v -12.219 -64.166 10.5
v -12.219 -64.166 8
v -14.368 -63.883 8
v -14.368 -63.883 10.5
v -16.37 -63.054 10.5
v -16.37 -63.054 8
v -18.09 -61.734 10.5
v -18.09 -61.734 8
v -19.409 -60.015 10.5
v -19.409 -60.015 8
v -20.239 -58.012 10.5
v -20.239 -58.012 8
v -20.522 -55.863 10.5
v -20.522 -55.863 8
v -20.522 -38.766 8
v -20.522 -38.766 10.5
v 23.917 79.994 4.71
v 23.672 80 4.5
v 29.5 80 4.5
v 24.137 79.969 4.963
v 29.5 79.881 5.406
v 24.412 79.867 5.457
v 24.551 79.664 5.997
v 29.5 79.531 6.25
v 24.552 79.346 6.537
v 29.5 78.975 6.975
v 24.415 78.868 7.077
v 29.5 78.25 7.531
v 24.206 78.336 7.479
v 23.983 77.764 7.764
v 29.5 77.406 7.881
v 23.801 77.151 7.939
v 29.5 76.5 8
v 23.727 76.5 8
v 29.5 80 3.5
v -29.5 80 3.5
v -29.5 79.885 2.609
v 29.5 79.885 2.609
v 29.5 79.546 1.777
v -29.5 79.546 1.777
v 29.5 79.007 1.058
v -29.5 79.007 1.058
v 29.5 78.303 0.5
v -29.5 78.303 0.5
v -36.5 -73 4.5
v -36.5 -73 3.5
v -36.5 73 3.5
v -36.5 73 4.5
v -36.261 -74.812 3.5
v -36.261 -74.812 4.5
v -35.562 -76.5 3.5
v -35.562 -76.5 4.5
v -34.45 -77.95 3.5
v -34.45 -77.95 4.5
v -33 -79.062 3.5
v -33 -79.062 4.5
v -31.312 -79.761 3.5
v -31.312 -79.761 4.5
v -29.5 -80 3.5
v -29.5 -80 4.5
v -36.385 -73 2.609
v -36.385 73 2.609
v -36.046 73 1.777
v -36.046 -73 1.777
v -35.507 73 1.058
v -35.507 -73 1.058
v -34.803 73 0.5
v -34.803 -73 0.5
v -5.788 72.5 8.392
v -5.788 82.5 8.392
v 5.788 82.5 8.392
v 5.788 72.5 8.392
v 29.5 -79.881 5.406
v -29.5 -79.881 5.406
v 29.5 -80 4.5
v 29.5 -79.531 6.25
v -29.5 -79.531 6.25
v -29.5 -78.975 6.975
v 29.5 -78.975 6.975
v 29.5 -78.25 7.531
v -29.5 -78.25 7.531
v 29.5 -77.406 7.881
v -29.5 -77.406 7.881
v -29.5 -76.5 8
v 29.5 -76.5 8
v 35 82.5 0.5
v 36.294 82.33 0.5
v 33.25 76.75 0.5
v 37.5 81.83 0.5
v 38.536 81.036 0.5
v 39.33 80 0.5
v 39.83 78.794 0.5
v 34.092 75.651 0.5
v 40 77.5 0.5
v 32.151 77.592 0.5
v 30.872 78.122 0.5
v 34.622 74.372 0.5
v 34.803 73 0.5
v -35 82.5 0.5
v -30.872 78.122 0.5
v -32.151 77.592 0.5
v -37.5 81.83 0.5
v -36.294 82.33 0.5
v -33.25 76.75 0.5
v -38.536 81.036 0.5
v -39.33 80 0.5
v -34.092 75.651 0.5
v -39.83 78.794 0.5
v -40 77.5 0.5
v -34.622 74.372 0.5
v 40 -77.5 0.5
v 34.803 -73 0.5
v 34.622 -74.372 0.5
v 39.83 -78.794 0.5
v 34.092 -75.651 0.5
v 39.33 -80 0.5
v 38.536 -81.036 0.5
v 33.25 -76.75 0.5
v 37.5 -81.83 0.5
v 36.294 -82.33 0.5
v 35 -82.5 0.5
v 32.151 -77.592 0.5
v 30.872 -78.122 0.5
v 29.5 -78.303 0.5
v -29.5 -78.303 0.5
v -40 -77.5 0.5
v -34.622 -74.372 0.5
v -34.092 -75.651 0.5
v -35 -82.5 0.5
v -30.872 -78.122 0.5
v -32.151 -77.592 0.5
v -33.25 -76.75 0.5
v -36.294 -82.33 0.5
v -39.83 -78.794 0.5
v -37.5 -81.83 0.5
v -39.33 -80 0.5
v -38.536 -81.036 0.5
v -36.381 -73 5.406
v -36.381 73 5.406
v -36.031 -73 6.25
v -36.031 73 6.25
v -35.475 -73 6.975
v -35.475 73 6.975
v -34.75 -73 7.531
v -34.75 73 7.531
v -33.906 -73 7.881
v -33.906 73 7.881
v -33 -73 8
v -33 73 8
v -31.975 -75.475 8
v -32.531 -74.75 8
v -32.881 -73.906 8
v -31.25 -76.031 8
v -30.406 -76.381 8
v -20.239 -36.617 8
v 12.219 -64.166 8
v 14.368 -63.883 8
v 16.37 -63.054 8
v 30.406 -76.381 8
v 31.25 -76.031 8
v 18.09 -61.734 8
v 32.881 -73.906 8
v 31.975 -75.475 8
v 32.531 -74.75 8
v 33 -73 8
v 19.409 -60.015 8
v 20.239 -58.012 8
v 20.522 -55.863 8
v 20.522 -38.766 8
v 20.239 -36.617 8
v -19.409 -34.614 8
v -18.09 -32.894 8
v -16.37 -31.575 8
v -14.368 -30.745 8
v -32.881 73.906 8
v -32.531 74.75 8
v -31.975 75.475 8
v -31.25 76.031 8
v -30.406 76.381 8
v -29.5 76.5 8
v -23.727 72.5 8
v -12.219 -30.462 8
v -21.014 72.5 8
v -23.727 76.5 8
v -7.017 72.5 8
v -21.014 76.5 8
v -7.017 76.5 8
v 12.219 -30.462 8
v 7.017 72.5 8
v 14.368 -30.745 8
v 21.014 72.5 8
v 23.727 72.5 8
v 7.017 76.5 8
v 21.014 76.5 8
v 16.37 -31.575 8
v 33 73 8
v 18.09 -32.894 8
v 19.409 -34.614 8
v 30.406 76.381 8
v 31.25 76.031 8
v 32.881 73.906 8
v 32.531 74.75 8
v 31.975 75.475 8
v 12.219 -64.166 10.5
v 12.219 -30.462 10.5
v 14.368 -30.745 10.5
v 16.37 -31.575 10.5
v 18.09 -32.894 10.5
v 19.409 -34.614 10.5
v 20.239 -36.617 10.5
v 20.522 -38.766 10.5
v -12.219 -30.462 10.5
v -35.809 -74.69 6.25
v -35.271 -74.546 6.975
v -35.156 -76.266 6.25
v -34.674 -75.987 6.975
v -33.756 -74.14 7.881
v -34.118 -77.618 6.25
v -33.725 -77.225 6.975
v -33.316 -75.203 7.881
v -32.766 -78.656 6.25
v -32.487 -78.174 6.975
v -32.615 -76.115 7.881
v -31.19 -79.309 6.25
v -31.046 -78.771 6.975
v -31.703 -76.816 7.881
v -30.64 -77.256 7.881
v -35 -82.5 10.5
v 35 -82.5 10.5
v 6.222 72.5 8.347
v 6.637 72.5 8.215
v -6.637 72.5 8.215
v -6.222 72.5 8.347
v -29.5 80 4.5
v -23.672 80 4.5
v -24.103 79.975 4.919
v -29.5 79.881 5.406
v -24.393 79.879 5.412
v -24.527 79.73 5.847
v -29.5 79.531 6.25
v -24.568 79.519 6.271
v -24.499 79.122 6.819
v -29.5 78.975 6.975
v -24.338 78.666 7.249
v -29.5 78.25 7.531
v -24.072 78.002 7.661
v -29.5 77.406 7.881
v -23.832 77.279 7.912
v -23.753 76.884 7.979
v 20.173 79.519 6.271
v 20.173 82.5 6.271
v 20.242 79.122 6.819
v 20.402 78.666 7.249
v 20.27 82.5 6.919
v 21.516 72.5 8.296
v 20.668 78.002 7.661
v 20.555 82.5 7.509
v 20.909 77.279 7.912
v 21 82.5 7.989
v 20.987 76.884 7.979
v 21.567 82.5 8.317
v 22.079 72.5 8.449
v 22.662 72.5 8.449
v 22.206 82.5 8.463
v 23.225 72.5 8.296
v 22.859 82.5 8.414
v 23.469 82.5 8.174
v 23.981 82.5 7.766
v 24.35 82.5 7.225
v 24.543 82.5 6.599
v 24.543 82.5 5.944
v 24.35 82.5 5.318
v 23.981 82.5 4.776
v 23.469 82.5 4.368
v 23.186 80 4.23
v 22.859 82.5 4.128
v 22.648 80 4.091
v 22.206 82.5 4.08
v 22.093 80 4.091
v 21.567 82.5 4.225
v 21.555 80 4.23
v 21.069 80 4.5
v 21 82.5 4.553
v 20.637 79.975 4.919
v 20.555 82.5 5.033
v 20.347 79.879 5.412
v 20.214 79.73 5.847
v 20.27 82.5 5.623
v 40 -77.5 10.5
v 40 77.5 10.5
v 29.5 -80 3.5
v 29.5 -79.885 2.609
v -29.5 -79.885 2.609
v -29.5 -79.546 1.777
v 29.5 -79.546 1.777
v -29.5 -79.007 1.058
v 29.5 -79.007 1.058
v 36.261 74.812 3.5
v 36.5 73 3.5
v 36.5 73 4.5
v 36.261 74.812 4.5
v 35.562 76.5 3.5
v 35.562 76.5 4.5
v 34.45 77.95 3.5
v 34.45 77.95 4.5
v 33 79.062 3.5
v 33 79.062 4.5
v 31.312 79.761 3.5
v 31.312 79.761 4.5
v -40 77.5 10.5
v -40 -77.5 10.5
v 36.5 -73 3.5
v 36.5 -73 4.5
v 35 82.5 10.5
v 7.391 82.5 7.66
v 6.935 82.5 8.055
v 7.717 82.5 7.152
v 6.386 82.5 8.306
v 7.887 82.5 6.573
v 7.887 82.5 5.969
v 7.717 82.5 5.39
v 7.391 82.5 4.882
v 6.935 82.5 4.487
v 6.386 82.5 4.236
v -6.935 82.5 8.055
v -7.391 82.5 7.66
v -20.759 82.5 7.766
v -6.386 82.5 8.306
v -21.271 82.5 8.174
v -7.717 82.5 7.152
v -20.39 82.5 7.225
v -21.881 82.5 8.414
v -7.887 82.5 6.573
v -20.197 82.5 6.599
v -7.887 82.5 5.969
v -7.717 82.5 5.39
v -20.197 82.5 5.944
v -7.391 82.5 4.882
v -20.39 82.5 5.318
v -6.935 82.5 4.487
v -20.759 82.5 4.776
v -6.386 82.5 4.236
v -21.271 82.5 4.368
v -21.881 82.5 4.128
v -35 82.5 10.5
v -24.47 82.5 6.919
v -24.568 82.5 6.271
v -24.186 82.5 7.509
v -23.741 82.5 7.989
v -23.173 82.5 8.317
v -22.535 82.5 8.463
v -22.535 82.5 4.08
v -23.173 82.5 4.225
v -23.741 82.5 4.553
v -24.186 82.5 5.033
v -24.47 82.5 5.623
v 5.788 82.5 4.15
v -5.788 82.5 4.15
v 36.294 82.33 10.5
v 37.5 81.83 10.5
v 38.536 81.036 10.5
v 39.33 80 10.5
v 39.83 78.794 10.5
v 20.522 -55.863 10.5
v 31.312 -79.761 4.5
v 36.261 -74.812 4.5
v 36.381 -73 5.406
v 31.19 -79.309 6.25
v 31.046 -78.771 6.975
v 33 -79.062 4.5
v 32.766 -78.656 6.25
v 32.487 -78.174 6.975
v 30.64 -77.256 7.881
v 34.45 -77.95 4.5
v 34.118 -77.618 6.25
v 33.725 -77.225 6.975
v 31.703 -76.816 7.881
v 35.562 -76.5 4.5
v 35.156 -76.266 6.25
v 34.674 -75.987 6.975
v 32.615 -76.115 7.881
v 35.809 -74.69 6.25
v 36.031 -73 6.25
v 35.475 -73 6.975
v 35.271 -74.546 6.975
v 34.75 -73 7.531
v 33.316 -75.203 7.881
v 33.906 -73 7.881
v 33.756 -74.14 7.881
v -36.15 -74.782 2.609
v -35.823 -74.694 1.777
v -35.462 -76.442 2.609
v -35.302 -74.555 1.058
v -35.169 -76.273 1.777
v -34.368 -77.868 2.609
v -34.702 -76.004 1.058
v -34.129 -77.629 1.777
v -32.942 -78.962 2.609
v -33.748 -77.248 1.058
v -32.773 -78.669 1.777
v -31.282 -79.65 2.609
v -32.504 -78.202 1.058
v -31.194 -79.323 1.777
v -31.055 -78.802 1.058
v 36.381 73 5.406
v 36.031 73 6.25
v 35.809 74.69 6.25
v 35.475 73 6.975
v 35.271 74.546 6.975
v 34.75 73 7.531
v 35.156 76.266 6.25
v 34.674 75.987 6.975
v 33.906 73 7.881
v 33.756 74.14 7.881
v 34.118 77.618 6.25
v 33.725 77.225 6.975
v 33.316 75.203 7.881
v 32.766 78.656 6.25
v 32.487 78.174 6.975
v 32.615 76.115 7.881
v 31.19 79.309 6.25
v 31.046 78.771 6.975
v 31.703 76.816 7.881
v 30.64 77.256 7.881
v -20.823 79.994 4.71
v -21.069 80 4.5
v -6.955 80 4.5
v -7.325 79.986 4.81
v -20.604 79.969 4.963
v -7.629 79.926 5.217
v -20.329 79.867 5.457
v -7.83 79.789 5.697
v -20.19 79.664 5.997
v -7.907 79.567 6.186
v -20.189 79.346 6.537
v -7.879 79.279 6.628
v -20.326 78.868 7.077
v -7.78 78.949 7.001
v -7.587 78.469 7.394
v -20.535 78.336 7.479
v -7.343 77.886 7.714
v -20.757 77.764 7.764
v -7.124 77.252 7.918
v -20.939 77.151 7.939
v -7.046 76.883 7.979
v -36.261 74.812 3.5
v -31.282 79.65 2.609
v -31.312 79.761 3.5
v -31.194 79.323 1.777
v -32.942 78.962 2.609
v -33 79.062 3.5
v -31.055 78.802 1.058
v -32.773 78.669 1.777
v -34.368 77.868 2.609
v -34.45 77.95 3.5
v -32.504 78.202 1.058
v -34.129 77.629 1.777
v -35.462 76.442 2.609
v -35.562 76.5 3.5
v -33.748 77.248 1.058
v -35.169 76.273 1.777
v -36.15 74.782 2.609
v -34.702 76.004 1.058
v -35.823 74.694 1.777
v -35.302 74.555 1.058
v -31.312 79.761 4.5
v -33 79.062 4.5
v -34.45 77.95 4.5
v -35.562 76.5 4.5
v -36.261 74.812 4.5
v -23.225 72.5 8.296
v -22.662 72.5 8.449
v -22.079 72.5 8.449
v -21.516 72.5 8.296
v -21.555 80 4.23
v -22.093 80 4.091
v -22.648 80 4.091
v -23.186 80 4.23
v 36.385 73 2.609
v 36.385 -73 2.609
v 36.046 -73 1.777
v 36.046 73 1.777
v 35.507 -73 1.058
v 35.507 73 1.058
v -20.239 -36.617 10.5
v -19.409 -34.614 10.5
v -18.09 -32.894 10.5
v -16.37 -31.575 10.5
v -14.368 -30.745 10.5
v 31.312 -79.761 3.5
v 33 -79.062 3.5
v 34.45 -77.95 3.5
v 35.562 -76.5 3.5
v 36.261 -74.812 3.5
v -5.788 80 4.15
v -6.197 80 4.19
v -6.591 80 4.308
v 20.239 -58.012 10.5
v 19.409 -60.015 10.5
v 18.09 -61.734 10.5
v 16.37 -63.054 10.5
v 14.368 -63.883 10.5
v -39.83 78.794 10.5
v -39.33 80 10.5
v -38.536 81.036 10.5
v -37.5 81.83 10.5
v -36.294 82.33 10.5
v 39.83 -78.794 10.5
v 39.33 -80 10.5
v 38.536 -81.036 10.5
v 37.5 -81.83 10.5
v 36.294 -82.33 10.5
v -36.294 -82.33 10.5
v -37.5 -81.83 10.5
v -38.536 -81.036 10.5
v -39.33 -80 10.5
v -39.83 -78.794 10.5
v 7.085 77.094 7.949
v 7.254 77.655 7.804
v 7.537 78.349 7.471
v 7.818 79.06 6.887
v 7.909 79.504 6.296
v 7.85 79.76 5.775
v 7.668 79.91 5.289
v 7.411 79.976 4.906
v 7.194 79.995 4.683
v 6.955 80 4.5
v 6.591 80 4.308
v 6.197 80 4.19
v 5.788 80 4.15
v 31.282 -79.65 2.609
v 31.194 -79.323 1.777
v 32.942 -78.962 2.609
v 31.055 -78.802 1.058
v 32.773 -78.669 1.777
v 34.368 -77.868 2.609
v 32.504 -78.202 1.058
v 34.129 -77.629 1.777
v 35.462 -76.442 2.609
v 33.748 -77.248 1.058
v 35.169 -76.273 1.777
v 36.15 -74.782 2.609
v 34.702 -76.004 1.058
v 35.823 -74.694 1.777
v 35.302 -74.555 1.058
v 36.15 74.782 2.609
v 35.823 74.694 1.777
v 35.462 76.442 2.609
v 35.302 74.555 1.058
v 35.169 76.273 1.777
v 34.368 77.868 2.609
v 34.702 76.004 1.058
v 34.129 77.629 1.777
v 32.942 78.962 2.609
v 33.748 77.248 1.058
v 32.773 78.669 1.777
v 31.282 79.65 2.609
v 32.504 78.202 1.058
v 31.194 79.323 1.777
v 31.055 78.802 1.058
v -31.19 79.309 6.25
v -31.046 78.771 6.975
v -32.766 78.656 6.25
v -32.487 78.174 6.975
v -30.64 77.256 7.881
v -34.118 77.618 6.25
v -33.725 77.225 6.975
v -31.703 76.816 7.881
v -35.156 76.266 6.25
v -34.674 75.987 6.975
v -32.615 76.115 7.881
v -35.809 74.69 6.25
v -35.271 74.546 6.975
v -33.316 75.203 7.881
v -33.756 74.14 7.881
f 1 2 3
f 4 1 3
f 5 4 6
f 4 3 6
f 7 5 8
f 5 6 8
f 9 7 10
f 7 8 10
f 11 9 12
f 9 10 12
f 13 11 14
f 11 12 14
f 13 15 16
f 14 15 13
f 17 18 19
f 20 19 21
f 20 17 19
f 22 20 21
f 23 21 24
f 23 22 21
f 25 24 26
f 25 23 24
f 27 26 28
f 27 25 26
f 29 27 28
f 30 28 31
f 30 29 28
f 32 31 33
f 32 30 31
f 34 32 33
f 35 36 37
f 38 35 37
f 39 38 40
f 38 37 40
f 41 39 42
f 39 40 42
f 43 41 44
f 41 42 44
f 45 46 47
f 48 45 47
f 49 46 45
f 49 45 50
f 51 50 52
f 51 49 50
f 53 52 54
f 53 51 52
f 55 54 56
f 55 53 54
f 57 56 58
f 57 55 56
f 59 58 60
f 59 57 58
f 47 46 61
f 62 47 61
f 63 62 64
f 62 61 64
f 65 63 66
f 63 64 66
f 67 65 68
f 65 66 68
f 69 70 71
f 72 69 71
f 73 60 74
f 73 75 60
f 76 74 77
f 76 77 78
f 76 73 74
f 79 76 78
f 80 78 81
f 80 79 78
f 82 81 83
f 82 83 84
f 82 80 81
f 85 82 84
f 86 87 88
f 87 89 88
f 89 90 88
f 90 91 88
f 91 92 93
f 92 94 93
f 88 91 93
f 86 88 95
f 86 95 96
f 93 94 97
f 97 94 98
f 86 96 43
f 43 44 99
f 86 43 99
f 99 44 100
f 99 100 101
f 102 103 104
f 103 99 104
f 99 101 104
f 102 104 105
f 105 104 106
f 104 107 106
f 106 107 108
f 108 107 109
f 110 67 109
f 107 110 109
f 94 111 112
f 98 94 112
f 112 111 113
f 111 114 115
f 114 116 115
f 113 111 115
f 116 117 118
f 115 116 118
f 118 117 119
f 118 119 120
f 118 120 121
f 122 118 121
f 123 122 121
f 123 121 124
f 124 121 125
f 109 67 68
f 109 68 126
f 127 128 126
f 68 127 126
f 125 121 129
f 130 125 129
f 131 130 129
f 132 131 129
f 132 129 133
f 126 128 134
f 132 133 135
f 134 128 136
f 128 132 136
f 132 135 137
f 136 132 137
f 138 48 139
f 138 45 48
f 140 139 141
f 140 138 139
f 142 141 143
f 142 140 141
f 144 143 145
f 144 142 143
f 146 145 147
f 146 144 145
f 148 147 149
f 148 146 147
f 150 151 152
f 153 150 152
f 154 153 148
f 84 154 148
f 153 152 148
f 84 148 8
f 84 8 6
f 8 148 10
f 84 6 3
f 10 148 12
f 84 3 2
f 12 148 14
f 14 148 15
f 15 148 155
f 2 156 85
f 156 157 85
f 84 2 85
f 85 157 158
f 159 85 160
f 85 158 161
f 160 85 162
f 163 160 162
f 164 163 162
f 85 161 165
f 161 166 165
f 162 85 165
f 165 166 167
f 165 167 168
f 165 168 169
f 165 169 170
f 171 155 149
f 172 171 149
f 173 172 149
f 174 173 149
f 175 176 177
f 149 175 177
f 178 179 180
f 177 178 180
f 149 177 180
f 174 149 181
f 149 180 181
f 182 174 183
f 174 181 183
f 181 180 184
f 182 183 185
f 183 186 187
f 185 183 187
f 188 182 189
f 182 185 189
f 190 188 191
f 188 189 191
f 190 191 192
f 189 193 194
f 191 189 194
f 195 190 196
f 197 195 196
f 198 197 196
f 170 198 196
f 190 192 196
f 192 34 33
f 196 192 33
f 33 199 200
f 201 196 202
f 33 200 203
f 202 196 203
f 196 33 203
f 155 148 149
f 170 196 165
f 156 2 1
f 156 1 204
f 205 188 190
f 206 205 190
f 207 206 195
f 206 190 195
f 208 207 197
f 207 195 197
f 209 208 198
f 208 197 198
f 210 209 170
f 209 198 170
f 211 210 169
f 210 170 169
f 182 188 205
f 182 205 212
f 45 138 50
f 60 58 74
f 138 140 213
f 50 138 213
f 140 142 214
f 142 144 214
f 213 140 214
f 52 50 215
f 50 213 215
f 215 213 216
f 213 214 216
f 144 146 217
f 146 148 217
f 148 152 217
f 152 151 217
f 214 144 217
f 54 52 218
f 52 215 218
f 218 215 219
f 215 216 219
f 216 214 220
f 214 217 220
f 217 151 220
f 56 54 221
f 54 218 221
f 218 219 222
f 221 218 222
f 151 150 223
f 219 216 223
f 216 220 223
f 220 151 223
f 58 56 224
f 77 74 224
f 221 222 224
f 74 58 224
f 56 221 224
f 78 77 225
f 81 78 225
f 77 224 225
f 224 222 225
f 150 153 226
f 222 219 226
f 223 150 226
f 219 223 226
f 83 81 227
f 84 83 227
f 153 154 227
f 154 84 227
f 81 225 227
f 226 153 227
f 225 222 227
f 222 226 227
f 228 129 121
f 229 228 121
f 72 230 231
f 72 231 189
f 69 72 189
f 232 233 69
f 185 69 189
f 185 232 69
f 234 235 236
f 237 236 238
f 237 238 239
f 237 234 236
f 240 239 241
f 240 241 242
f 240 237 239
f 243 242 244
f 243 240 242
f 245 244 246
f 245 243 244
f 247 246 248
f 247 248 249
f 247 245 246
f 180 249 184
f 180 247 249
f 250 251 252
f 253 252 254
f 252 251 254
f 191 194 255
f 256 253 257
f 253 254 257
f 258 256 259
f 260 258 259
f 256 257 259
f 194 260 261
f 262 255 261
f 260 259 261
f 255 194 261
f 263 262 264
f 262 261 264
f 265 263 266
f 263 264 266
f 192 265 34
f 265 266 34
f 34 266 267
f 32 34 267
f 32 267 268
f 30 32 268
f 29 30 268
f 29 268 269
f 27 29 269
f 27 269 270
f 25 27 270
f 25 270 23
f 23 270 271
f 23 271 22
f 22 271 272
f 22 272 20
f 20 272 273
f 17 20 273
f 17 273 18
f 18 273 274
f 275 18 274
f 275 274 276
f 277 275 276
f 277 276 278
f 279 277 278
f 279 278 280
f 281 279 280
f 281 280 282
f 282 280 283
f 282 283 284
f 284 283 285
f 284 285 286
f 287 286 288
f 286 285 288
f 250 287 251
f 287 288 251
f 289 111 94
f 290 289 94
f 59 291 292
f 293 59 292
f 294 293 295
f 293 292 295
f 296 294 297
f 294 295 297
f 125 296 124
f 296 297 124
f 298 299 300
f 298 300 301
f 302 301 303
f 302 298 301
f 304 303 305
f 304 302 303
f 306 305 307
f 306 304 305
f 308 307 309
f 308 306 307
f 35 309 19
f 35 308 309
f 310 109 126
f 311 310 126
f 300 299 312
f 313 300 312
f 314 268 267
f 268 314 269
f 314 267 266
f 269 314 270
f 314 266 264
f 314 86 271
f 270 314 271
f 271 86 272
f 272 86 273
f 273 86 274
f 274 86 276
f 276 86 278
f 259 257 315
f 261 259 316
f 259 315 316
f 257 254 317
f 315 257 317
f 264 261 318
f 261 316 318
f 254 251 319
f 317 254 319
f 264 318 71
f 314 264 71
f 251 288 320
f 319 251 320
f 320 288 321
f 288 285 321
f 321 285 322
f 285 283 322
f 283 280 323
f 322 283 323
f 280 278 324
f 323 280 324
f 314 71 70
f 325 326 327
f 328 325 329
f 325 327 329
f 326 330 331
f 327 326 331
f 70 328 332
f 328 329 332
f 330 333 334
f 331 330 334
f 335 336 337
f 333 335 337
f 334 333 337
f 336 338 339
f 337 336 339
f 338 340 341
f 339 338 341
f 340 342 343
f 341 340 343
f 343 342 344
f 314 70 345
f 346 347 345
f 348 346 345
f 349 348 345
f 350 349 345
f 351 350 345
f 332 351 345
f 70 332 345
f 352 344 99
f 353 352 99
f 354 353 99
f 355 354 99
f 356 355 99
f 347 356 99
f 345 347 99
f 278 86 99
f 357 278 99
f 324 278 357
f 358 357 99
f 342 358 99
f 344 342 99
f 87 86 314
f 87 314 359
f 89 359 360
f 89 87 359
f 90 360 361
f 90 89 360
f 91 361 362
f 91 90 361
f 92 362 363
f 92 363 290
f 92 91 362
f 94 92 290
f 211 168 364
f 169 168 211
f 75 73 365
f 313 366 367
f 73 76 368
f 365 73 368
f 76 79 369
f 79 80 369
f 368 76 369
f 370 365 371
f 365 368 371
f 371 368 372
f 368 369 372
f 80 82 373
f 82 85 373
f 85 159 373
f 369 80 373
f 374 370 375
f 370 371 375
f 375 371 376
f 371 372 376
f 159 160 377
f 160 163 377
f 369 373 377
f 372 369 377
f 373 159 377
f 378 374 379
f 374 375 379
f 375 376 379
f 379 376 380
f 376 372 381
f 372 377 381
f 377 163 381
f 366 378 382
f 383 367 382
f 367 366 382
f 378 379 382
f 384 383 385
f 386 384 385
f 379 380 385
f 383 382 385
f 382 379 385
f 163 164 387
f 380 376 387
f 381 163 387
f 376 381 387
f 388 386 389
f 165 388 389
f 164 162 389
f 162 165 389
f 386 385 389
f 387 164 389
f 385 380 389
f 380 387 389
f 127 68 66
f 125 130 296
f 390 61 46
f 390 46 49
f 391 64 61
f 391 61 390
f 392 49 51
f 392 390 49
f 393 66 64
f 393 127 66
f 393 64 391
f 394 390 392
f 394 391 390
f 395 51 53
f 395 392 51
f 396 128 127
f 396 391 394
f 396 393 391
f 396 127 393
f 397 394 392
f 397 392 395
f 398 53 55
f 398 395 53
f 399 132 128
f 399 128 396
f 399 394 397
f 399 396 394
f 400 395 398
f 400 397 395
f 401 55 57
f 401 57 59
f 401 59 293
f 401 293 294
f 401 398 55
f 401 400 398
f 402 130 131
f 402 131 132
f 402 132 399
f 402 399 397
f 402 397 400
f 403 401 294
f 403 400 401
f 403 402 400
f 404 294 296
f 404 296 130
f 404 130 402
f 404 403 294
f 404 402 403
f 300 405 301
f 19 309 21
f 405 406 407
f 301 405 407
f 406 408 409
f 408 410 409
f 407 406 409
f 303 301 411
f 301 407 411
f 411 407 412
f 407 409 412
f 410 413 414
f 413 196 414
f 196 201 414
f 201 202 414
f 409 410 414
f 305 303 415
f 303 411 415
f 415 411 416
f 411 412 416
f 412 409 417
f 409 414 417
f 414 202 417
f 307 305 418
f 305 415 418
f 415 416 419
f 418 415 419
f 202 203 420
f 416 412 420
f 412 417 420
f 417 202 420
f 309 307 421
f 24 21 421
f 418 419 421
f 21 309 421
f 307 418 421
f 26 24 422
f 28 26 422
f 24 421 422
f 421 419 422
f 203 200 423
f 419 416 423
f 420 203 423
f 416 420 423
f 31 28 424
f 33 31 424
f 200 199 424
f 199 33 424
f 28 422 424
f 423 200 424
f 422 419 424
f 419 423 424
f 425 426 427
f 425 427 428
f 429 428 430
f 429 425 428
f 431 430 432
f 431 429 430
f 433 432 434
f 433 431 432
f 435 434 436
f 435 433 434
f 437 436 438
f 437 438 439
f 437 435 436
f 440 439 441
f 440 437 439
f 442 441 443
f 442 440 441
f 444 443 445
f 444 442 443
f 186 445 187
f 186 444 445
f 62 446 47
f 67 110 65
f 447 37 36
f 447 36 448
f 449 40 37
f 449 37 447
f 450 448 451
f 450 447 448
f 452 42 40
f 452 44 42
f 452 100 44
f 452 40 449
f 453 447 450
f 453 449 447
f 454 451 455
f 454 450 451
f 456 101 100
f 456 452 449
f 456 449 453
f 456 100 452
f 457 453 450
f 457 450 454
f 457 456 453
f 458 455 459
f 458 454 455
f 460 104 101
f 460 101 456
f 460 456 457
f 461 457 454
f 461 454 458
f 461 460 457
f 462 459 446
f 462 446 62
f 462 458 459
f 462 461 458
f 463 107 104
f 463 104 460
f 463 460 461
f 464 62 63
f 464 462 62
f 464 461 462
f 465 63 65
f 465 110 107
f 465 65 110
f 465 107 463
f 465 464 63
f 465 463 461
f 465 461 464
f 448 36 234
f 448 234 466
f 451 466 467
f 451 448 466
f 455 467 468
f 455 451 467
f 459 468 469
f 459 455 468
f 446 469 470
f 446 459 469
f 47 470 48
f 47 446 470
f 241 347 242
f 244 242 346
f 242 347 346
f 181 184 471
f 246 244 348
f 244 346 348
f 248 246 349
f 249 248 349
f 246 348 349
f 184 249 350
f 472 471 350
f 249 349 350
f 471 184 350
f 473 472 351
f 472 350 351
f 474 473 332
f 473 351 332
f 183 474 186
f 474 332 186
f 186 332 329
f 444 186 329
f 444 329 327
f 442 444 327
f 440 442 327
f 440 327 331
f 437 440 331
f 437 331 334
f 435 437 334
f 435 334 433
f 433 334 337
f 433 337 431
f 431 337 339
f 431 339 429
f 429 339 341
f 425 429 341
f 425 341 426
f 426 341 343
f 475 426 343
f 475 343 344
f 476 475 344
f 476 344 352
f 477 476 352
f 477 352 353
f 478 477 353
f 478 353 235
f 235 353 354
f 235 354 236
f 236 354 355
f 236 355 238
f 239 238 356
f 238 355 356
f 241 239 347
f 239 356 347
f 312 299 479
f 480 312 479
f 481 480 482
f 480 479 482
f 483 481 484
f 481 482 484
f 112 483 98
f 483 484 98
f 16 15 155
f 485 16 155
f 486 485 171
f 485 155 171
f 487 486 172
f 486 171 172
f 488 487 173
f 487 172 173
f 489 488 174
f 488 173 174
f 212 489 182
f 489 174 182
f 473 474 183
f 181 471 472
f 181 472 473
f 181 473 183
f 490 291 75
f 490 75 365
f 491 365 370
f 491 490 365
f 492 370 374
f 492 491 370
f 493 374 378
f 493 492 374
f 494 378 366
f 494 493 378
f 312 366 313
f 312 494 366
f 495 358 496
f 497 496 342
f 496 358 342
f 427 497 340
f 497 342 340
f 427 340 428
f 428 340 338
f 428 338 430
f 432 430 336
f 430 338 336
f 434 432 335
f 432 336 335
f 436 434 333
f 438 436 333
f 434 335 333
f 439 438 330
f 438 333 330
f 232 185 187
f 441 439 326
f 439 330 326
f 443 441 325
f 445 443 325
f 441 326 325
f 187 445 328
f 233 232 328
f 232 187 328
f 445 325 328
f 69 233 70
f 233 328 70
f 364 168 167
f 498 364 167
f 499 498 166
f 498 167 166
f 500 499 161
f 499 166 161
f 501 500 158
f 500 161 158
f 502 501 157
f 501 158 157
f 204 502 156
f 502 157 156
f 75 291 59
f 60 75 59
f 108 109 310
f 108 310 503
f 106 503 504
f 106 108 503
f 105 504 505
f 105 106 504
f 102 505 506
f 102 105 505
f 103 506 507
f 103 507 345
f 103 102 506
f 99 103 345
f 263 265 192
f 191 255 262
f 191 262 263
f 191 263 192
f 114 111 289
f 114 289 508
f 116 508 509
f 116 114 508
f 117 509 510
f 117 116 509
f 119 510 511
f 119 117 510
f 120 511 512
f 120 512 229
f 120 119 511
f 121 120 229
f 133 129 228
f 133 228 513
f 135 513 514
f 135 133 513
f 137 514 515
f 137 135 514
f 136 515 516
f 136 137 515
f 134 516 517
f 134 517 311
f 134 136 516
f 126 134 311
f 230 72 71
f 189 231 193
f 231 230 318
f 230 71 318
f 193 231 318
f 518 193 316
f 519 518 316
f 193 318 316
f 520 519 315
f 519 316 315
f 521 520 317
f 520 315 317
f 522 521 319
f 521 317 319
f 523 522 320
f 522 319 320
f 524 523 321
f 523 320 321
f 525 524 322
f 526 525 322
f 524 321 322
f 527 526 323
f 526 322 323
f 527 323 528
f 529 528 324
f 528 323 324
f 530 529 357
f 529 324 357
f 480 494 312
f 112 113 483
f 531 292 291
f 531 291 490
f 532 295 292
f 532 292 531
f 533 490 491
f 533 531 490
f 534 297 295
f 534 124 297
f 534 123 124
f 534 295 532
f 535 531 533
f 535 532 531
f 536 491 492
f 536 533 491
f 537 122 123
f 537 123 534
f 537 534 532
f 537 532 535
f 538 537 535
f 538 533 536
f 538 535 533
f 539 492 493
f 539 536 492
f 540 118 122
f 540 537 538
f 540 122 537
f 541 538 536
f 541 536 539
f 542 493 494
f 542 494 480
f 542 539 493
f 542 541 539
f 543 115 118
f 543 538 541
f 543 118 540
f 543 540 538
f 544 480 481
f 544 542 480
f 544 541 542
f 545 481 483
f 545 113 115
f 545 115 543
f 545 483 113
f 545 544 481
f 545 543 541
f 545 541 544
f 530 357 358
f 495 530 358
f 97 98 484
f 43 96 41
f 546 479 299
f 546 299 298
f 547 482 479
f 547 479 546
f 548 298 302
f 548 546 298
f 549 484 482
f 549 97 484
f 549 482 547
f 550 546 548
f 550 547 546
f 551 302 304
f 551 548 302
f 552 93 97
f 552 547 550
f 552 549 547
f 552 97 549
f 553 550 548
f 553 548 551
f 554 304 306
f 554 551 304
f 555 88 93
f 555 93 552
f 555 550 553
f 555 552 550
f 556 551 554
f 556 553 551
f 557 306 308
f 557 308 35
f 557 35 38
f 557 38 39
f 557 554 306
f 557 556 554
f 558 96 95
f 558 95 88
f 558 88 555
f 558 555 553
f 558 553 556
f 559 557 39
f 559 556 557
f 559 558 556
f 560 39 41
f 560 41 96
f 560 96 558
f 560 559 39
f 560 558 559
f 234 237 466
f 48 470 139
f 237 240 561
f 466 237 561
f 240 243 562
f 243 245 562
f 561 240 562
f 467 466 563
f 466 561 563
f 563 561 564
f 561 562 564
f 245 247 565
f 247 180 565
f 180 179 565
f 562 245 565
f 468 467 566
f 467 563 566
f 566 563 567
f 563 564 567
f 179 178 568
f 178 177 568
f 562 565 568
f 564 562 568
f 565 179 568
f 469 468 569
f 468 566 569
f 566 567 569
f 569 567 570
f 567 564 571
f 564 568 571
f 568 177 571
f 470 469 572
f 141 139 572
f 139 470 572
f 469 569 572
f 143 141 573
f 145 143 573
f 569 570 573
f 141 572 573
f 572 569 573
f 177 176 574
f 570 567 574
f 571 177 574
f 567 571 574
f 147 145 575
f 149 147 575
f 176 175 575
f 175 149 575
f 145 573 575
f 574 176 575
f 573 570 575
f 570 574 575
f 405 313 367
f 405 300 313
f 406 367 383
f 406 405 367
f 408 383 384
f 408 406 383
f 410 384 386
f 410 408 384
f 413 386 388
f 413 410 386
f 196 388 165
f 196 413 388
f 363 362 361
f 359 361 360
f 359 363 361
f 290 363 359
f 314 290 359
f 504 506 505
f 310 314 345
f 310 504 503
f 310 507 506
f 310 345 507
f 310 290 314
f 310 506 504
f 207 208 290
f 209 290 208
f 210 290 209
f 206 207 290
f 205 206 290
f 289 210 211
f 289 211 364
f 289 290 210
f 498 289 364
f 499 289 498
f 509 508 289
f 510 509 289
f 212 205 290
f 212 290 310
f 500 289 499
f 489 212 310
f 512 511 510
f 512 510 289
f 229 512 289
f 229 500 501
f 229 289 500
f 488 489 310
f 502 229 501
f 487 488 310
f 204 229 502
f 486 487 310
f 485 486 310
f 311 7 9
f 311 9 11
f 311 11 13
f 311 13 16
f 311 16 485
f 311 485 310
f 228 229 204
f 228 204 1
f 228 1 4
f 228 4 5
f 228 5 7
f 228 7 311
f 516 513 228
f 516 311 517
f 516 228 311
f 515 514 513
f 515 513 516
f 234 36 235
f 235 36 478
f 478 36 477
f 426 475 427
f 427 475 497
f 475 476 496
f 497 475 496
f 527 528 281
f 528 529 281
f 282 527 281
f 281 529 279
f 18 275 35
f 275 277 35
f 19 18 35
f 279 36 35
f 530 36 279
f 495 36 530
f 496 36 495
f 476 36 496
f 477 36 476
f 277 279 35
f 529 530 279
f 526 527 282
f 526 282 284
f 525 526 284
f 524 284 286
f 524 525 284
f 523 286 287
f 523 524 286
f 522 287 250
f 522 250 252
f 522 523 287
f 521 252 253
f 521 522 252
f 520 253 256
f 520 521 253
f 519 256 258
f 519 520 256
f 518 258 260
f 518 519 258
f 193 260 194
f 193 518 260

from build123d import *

# Parameters (mm, degrees)
EXTRUDE004_DEPTH = 10
SKETCH003_R      = 2.197673
EXTRUDE003_DEPTH = 10
EXTRUDE_DEPTH    = 8
FILLET_R         = 3.5
EXTRUDE001_DEPTH = 2.5
EXTRUDE002_DEPTH = 10


with BuildPart() as extrude004:
    # Sketch004 (on Face35 of Cut) → Extrude004 (new body)
    with BuildSketch(Plane(origin=(0, 0, 8), x_dir=(1, 0, 0), z_dir=(0, 0, -1))):
        with BuildLine():
            ThreePointArc((-12.218708, 64.166268), (-18.089957, 61.734317), (-20.521908, 55.863067))
            Line((-20.521908, 38.765661), (-20.521908, 55.863067))
            ThreePointArc((-20.521908, 38.765661), (-18.089957, 32.894412), (-12.218708, 30.462461))
            Line((12.218708, 30.462461), (-12.218708, 30.462461))
            ThreePointArc((12.218708, 30.462461), (18.089957, 32.894412), (20.521908, 38.765661))
            Line((20.521908, 55.863067), (20.521908, 38.765661))
            ThreePointArc((20.521908, 55.863067), (18.089957, 61.734317), (12.218708, 64.166268))
            Line((-12.218708, 64.166268), (12.218708, 64.166268))
        make_face()
    extrude(amount=-EXTRUDE004_DEPTH)


with BuildPart() as compound_features_to_remove:
    # Sketch003 (on Face6 of Cut) → Extrude003 (new body)
    with BuildSketch(Plane(origin=(0, 82.5, 0), x_dir=(-1, 0, 0), z_dir=(0, 1, 0))):
        with Locations((-22.370322, 6.27106)):
            Circle(SKETCH003_R)
        with Locations((22.370322, 6.27106)):
            Circle(SKETCH003_R)
        with BuildLine():
            ThreePointArc((5.787986, 4.150016), (7.90903, 6.27106), (5.787986, 8.392104))
            Line((5.787986, 8.392104), (-5.787986, 8.392104))
            ThreePointArc((-5.787986, 8.392104), (-7.90903, 6.27106), (-5.787986, 4.150016))
            Line((-5.787986, 4.150016), (5.787986, 4.150016))
        make_face()
    extrude(amount=-EXTRUDE003_DEPTH)

    # Compound: union Extrude004
    add(extrude004.part)


with BuildPart() as fillet_body:
    # Sketch → Extrude (new body)
    with BuildSketch(Plane.XY):
        with BuildLine():
            ThreePointArc((-29.5, 80), (-34.449747, 77.949747), (-36.5, 73))
            Line((-36.5, -73), (-36.5, 73))
            ThreePointArc((-36.5, -73), (-34.449747, -77.949747), (-29.5, -80))
            Line((29.5, -80), (-29.5, -80))
            ThreePointArc((29.5, -80), (34.449747, -77.949747), (36.5, -73))
            Line((36.5, 73), (36.5, -73))
            ThreePointArc((36.5, 73), (34.449747, 77.949747), (29.5, 80))
            Line((-29.5, 80), (29.5, 80))
        make_face()
    extrude(amount=EXTRUDE_DEPTH)

    # Fillet
    fillet_edges = [fillet_body.edges().sort_by_distance(p)[0] for p in [
        (-34.449747, 77.949747, 0),
        (-34.449747, 77.949747, 8),
        (-36.5, 0, 0),
        (-36.5, 0, 8),
        (-34.449747, -77.949747, 0),
        (-34.449747, -77.949747, 8),
        (0, -80, 0),
        (0, -80, 8),
        (34.449747, -77.949747, 0),
        (34.449747, -77.949747, 8),
        (36.5, 0, 0),
        (36.5, 0, 8),
        (34.449747, 77.949747, 0),
        (34.449747, 77.949747, 8),
        (0, 80, 0),
        (0, 80, 8),
    ]]
    fillet(fillet_edges, radius=FILLET_R)


with BuildPart() as phoneblank:
    # Sketch001 (on Face9 of Fillet) → Extrude001 (new body, symmetric)
    with BuildSketch(Plane(origin=(0, 0, 0), x_dir=(1, 0, 0), z_dir=(0, 0, -1))):
        with BuildLine():
            ThreePointArc((-29.5, 78.25), (-33.212311, 76.712311), (-34.75, 73))
            Line((-34.75, -73), (-34.75, 73))
            ThreePointArc((-34.75, -73), (-33.212311, -76.712311), (-29.5, -78.25))
            Line((29.5, -78.25), (-29.5, -78.25))
            ThreePointArc((29.5, -78.25), (33.212311, -76.712311), (34.75, -73))
            Line((34.75, 73), (34.75, -73))
            ThreePointArc((34.75, 73), (33.212311, 76.712311), (29.5, 78.25))
            Line((-29.5, 78.25), (29.5, 78.25))
        make_face()
    extrude(amount=EXTRUDE001_DEPTH, both=True)

    # Fusion: union Fillet body
    add(fillet_body.part)


with BuildPart() as cut001:
    # Sketch002 (on Face4 of Fusion) → Extrude002 (new body)
    with BuildSketch(Plane(origin=(0, 0, 0.5), x_dir=(1, 0, 0), z_dir=(0, 0, -1))):
        with BuildLine():
            Line((-35, 82.5), (35, 82.5))
            ThreePointArc((40, 77.5), (38.535534, 81.035534), (35, 82.5))
            Line((40, 77.5), (40, -77.5))
            ThreePointArc((35, -82.5), (38.535534, -81.035534), (40, -77.5))
            Line((35, -82.5), (-35, -82.5))
            ThreePointArc((-40, -77.5), (-38.535534, -81.035534), (-35, -82.5))
            Line((-40, -77.5), (-40, 77.5))
            ThreePointArc((-35, 82.5), (-38.535534, 81.035534), (-40, 77.5))
        make_face()
    extrude(amount=-EXTRUDE002_DEPTH)

    # Cut: cut PhoneBlank
    add(phoneblank.part, mode=Mode.SUBTRACT)

    # Cut001: cut  Compound - Features to remove
    add(compound_features_to_remove.part, mode=Mode.SUBTRACT)


solid = cut001.part
